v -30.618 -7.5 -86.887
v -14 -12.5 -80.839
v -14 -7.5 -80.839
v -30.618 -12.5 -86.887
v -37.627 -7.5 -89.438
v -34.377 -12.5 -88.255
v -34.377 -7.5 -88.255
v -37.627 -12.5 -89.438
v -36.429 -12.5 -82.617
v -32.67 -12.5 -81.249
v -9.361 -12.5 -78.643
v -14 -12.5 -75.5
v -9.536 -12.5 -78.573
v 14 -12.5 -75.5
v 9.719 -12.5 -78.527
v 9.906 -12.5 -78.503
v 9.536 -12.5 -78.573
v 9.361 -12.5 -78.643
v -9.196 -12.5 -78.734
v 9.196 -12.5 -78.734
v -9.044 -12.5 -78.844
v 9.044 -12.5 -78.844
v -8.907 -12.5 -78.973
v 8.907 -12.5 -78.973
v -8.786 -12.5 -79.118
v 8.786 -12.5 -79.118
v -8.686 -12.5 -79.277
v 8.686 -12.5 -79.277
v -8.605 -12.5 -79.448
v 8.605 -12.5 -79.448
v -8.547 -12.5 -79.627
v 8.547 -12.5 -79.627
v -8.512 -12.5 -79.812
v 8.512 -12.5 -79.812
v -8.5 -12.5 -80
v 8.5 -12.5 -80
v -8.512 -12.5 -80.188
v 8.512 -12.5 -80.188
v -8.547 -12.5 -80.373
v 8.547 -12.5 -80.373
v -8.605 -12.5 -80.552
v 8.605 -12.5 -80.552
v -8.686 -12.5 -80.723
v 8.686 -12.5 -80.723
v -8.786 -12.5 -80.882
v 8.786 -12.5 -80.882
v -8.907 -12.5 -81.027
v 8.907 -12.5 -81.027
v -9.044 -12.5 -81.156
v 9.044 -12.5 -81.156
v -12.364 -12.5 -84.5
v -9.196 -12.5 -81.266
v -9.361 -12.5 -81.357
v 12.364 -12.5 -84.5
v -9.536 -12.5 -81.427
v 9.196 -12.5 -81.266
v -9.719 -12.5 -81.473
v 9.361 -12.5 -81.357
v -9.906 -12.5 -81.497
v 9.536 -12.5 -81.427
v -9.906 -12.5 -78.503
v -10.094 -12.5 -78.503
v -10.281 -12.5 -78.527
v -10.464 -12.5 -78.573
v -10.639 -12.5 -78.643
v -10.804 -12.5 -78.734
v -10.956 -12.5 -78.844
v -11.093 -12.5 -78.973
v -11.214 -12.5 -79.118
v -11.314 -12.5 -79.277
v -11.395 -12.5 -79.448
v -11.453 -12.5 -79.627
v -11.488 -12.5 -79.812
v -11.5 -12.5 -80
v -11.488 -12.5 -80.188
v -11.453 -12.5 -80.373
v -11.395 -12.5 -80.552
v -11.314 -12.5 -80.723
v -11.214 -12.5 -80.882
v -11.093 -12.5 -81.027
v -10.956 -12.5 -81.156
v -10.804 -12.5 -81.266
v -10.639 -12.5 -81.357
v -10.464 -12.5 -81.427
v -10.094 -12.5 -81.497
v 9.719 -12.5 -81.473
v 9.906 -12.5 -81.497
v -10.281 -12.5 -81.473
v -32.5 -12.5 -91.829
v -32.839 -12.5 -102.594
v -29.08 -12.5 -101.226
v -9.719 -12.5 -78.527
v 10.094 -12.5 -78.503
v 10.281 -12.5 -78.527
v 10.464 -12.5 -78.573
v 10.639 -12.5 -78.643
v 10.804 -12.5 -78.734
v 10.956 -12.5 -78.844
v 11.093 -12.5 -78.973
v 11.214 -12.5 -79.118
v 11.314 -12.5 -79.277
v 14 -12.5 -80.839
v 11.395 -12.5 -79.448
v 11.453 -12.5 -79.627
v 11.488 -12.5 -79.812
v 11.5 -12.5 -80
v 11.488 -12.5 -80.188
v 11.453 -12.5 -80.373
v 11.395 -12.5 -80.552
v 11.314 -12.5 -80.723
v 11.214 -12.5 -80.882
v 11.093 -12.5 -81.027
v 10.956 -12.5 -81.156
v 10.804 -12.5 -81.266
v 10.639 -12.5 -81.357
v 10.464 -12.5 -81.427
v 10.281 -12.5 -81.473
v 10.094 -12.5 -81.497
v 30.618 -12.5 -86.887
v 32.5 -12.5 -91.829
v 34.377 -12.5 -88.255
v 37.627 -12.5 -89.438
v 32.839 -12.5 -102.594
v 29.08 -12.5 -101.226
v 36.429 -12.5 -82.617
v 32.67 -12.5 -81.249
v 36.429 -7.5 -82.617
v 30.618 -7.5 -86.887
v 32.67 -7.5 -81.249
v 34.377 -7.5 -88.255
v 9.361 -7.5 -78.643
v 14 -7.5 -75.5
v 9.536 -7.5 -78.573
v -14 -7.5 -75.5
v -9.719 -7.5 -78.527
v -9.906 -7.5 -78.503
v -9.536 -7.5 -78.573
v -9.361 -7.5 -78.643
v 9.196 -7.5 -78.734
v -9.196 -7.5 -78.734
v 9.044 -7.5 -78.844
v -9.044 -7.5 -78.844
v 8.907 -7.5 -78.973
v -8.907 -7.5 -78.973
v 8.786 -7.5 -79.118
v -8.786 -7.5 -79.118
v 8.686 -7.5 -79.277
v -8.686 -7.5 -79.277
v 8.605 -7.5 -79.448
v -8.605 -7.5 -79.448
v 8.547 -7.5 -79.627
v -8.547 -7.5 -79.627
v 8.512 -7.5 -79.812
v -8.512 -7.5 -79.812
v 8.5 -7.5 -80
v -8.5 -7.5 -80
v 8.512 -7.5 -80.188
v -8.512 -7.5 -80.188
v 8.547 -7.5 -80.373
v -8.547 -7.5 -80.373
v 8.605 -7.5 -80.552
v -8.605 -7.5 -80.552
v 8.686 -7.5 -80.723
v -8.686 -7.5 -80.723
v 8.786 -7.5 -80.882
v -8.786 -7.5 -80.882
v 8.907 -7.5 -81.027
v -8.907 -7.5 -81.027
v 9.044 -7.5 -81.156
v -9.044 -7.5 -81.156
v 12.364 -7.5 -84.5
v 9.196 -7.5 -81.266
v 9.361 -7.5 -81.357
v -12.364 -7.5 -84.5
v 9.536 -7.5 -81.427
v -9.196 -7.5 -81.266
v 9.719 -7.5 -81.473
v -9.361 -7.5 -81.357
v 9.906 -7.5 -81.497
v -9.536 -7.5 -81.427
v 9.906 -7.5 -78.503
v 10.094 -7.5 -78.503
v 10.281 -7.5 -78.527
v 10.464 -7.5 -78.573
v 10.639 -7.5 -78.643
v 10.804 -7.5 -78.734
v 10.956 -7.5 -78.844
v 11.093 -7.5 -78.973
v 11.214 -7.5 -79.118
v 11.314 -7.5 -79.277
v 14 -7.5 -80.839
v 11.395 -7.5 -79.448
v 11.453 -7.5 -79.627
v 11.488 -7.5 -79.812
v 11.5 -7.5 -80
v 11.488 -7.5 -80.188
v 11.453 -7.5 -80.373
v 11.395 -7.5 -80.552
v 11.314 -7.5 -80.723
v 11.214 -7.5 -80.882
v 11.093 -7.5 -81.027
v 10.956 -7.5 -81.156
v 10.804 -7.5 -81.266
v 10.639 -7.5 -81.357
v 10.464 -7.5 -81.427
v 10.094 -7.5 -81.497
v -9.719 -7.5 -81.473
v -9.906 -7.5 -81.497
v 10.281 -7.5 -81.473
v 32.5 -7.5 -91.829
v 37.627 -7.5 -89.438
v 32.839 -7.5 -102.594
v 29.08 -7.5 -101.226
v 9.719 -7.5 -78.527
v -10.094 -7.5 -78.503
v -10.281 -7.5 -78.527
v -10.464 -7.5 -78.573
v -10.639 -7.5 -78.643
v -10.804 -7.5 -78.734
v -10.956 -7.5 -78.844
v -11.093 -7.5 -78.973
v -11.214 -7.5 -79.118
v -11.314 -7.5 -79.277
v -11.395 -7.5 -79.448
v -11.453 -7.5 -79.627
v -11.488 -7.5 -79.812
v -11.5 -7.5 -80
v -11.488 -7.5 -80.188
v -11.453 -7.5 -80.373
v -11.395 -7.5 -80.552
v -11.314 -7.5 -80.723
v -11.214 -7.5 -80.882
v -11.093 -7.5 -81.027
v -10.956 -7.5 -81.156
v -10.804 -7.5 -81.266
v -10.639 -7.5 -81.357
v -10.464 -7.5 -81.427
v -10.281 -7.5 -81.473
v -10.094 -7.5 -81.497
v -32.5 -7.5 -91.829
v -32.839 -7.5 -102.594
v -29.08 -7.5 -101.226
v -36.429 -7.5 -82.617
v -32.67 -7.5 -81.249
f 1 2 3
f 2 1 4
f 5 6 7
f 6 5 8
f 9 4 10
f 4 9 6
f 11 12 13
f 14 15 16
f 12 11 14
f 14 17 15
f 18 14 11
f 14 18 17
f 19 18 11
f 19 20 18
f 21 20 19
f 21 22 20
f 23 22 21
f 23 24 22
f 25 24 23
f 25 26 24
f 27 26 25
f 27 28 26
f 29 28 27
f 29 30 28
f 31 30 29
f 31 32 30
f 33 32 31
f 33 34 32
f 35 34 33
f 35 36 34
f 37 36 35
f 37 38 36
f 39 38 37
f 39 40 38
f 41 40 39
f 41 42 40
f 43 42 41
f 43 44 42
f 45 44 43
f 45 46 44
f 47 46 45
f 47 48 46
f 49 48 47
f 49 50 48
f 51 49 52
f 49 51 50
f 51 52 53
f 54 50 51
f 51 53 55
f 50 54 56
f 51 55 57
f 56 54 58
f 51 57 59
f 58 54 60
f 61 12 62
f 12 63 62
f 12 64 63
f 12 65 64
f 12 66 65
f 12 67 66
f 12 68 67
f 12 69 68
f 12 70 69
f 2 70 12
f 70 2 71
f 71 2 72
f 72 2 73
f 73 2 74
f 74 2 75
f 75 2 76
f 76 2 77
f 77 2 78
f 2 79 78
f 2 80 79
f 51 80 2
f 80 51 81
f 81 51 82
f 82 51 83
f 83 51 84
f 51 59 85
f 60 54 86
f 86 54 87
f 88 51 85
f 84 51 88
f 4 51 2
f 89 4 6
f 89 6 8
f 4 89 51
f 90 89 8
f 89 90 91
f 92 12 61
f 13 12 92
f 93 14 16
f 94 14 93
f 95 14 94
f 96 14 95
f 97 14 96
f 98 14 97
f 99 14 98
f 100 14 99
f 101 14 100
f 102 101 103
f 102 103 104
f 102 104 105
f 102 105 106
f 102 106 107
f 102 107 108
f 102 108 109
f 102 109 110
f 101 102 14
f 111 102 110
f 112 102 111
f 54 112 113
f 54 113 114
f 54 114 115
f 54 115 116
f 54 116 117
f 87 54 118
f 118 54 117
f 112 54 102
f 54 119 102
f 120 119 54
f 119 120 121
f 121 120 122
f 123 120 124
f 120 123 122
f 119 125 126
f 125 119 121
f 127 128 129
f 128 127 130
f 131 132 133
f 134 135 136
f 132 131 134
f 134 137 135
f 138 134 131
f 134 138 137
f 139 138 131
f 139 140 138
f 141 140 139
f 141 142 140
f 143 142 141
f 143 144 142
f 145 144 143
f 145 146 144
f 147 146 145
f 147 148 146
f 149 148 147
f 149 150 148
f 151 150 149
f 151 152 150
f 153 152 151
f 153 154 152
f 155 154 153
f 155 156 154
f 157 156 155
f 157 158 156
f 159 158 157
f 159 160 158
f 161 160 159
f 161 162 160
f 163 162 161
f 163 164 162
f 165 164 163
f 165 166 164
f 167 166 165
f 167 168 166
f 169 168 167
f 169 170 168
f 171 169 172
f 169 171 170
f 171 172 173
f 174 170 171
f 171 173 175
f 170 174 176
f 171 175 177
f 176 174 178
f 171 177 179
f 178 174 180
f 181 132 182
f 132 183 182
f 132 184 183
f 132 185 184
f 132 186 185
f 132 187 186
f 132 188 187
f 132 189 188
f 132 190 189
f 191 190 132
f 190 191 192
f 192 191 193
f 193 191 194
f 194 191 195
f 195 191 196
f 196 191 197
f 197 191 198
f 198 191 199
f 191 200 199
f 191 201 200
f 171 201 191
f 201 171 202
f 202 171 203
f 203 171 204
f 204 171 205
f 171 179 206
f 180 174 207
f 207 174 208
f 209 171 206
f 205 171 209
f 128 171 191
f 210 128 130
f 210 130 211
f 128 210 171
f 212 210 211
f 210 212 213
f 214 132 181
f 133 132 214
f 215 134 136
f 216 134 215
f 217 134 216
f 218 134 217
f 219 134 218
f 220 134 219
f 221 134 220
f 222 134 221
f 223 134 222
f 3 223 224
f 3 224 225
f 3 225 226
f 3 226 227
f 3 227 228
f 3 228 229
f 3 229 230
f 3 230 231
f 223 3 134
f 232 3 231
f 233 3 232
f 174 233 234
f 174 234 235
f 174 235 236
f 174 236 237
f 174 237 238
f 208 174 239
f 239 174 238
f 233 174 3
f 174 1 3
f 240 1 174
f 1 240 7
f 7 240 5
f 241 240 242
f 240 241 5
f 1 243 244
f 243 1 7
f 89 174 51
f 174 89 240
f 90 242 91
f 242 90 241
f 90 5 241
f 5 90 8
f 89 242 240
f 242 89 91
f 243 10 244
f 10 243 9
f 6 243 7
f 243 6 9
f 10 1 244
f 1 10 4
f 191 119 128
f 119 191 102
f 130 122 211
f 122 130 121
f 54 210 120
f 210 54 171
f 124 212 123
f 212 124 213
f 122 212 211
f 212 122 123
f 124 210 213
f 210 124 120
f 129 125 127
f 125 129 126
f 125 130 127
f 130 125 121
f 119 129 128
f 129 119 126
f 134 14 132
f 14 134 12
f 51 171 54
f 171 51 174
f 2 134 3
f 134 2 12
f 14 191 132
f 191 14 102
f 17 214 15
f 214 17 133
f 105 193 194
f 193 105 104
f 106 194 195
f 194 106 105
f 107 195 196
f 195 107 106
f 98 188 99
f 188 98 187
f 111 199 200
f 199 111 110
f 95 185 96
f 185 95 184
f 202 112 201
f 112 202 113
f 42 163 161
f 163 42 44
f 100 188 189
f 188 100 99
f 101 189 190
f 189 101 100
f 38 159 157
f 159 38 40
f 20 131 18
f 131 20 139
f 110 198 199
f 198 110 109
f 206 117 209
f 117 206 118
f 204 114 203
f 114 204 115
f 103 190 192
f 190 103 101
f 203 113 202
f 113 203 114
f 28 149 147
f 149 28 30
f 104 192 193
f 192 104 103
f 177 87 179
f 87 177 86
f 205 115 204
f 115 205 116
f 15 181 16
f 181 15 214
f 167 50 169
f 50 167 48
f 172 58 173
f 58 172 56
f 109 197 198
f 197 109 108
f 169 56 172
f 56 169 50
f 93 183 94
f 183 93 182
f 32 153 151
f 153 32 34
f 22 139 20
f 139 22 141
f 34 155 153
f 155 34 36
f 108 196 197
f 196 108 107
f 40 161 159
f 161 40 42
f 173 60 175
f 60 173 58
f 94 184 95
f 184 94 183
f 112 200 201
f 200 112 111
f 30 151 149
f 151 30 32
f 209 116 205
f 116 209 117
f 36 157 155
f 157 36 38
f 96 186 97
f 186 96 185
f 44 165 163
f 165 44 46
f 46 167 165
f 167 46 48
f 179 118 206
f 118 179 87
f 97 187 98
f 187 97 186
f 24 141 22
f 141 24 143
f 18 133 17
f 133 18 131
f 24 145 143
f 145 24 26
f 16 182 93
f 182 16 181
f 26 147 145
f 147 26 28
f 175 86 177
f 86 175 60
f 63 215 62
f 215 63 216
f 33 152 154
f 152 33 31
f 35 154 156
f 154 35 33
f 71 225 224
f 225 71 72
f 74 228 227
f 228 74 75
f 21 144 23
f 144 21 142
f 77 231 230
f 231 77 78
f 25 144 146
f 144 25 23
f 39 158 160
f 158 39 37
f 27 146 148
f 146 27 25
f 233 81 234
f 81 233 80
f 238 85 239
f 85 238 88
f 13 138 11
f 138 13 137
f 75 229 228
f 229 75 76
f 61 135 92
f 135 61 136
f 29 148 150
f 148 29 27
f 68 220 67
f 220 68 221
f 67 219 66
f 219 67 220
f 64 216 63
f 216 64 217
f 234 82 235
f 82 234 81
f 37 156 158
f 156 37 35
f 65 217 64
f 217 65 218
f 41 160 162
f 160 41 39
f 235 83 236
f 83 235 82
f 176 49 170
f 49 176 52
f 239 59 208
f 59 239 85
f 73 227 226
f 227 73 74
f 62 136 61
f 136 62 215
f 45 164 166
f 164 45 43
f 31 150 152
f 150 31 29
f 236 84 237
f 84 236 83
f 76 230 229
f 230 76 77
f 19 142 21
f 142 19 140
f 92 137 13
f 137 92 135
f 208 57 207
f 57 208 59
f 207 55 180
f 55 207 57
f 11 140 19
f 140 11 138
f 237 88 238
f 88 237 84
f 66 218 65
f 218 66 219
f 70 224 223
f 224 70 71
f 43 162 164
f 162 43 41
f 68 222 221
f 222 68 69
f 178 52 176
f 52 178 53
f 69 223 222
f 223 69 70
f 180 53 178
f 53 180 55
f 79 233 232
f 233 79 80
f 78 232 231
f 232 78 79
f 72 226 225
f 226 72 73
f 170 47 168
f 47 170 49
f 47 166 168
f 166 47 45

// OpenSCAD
// O apoio será composto de um suporte
// que funcionará sob leve pressão no
// vão do console. A parte mais complexa
// da modelagem é este suporte.

// Altura total do suporte (sob pressão)
a_suporte = 100;

// Dimensões da mola
c_mola = 35;
d_mola = 7;

// Curso total da mola
corrida_mola = 15;

// Curso da mola sob pressão
trabalho_mola = 10;

// Dimensões dos eixos
d_eixo = 5;
c_eixo = c_mola + 20;

// Dimensões do corpo
l_corpo = 20 + 3 * d_eixo;
p_corpo = 10;
c_corpo = a_suporte / 2 - ( c_mola - trabalho_mola ) / 2;

folga = 10;

// Distância entre clilindros laterais e parede:
d_cil_par = 2;

// Dimensões dos vãos para os links:
l_vaos = 4;
d_vao_parede_a = 15;
d_vao_parede_b = 5;

// Dimensões do encaixe:
l_encaixe = l_corpo / 2;

// Diâmetro do eixo para sapata:
d_parafuso = 3.5;

// Teremos dois elementos estruturais que
// suportarão eixos e mola:

module corpo(){
    
    difference(){
        union(){
            // Corpo:
            difference(){
                translate( [ 0, -c_corpo / 2 - ( c_mola - trabalho_mola ) / 2, 0 ] )
                    cube( [ l_corpo, c_corpo, p_corpo ], center = true );
               translate( [ -500, -1000 - corrida_mola - c_corpo + 1.4 * p_corpo, -500 ] )
                   cube( [ 1000, 1000, 1000 ] );
            }
            // Encaixe
            translate( [ -l_encaixe / 2, -corrida_mola - c_corpo + p_corpo, 0 ] )
                rotate( 90, [ 0, 1, 0 ] )
                    cylinder( d = p_corpo, h = l_encaixe, $fn = 50 );

translate( [ -l_corpo / 2, -c_corpo / 2 - ( c_mola - trabalho_mola ) / 2 + 8, 0 ] )
    rotate( 90, [ 0, 0, 1 ] )
        cylinder( h = p_corpo / 2, r = 10, $fn = 3 );
translate( [ l_corpo / 2, -c_corpo / 2 - ( c_mola - trabalho_mola ) / 2 + 8, 0 ] )
    rotate( 90, [ 0, 0, 1 ] )
        cylinder( h = p_corpo / 2, r = 10, $fn = 3 );
        }
        
        // Cilindros para os eixos:
        rotate( 90, [ 1, 0, 0 ] )
            cylinder( d = d_eixo, h = c_eixo / 2 + corrida_mola / 2, $fn = 50 );
        translate( [ l_corpo / 2 - d_eixo / 2 - d_cil_par, 0, 0 ] )
            rotate( 90, [ 1, 0, 0 ] )
                cylinder( d = d_eixo, h = c_eixo/ 2 + corrida_mola / 2, $fn = 50 );
        translate( [ -( l_corpo / 2 - d_eixo / 2 - d_cil_par ), 0, 0 ] )
            rotate( 90, [ 1, 0, 0 ] )
                cylinder( d = d_eixo, h = c_eixo / 2 + corrida_mola / 2, $fn = 50 );
        // Vãos para os elos:
        translate( [ -l_vaos / 2 + ( l_corpo / 2 - d_eixo / 2 - d_cil_par ) / 2, -c_corpo - ( c_mola - trabalho_mola ) / 2 + d_vao_parede_a, -25 ] )
            cube( [ l_vaos, c_corpo - ( d_vao_parede_a + d_vao_parede_b ), 50 ] );
        translate( [ -l_vaos / 2 - ( l_corpo / 2 - d_eixo / 2 - d_cil_par ) / 2, -c_corpo - ( c_mola - trabalho_mola ) / 2 + d_vao_parede_a, -25 ] )
            cube( [ l_vaos, c_corpo - ( d_vao_parede_a + d_vao_parede_b ), 50 ] );
        
        // Furo para o eixo da sapata:
        translate( [ -250, -corrida_mola - c_corpo + p_corpo, 0 ] )
            rotate( 90, [ 0, 1, 0 ] )
                cylinder( h = 500, d = d_parafuso, $fn = 50 );
    }
}

l_aba_pe = ( l_corpo - l_encaixe ) / 2 - 0.5;
p_aba_pe = p_corpo * 1.0;
h_aba_pe = 10;
delta_aba_pe = 0.1;

h_sapata = 2;
l_sapata = 50;
c_sapata = 30;

module sapata(){
    difference(){
        union(){
            translate( [ -l_aba_pe / 2 - ( l_corpo / 2 - l_aba_pe / 2 ), -corrida_mola - c_corpo + 1.4 * p_corpo - h_aba_pe - delta_aba_pe, -p_aba_pe / 2 ] )
                cube( [ l_aba_pe, h_aba_pe - p_aba_pe / 2, p_aba_pe ] );
            translate( [ -l_aba_pe / 2 - ( l_corpo / 2 - l_aba_pe / 2 ), -corrida_mola - c_corpo + 1.4 * p_corpo - h_aba_pe - delta_aba_pe + ( h_aba_pe - p_aba_pe / 2 ), 0 ] )
                rotate( 90, [ 0, 1, 0 ] )
                cylinder( h = l_aba_pe, d = p_aba_pe, $fn = 50 );
            translate( [ -l_aba_pe / 2 + ( l_corpo / 2 - l_aba_pe / 2 ), -corrida_mola - c_corpo + 1.4 * p_corpo - h_aba_pe - delta_aba_pe, -p_aba_pe / 2 ] )
                cube( [ l_aba_pe, h_aba_pe - p_aba_pe / 2, p_aba_pe ] );
            translate( [ -l_aba_pe / 2 + ( l_corpo / 2 - l_aba_pe / 2 ), -corrida_mola - c_corpo + 1.4 * p_corpo - h_aba_pe - delta_aba_pe + ( h_aba_pe - p_aba_pe / 2 ), 0 ] )
                rotate( 90, [ 0, 1, 0 ] )
                cylinder( h = l_aba_pe, d = p_aba_pe, $fn = 50 );
            
            translate( [ -l_sapata / 2, , -corrida_mola - c_corpo + 1.4 * p_corpo - h_aba_pe - delta_aba_pe- h_sapata + 1, -c_sapata / 2 ] )
                cube( [ l_sapata, h_sapata, c_sapata ] );
        }
        // Furo para o eixo da sapata:
        translate( [ -250, -corrida_mola - c_corpo + p_corpo, 0 ] )
            rotate( 90, [ 0, 1, 0 ] )
                cylinder( h = 500, d = d_parafuso, $fn = 50 );
    }
}

d_links_furos = 40;
d_furos = 3.3;
d_links = d_links_furos + 10;
l_links = d_vao_parede_a + 5;
a_links = 4;
module links(){
    difference(){
        translate( [ -l_links / 2, -d_links / 2, p_corpo / 2 + 0.4 ] )
            cube( [ l_links, d_links, a_links ] );
        
        translate( [ ( l_corpo / 2 - d_eixo / 2 - d_cil_par ) / 2, -d_links_furos / 2, -50 ] )
            cylinder( d = d_furos, h = 100, $fn = 50 );
        translate( [ -( l_corpo / 2 - d_eixo / 2 - d_cil_par ) / 2, -d_links_furos / 2, -50 ] )
            cylinder( d = d_furos, h = 100, $fn = 50 );
        translate( [ ( l_corpo / 2 - d_eixo / 2 - d_cil_par ) / 2, d_links_furos / 2, -50 ] )
            cylinder( d = d_furos, h = 100, $fn = 50 );
        translate( [ -( l_corpo / 2 - d_eixo / 2 - d_cil_par ) / 2, d_links_furos / 2, -50 ] )
            cylinder( d = d_furos, h = 100, $fn = 50 );
    }
}

//theta_garra = 30;
//l_min_garra = 65;
//w_garra = 3;
//a_garra = 5;
//l_dedo_garra = 10;
//w_dedo_garra = w_garra;

theta_garra = 20;
l_min_garra = 65;
w_garra = 4;
a_garra = 5;
l_dedo_garra = 10;
w_dedo_garra = w_garra;

module meia_garra(){
    rotate( theta_garra, [ 0, 0, 1 ] ){
        cube( [ w_garra, l_min_garra / cos( theta_garra ) / 2 + 1, a_garra ] );
    translate( [ -l_dedo_garra, l_min_garra / cos( theta_garra ) / 2, 0 ] )
        cube( [ l_dedo_garra + w_garra, w_dedo_garra, a_garra ] );
    translate( [ 0, l_min_garra / cos( theta_garra ) / 2 * 0.9, 0 ] )
        cube( [ 6 + w_garra, w_dedo_garra, a_garra ] );
    }
}

c_cubo_garra = 28;
l_cubo_garra = 9;
dist_hole_garra = 20;
d_hole_garra = 3;
module garra(){
    difference(){
        translate( [ 0, a_garra - ( c_mola - trabalho_mola ) / 2, -l_braco ] )
            rotate( 90, [ 1, 0, 0 ] )
                rotate( 90, [ 0, 0, 1 ] ){
                    meia_garra();
                    mirror( [ 0, 1, 0 ] )
                        meia_garra();
                    translate( [ -l_cubo_garra / 2 + 0, -c_cubo_garra / 2, 0 ] )
                        cube( [ l_cubo_garra, c_cubo_garra, a_garra ] );
                }
                
       translate( [ dist_hole_garra / 2, 0, -l_braco ] )
            rotate( 90, [ 1, 0, 0 ] )
                cylinder( h = 1000, d = d_hole_garra, $fn = 50 );
       translate( [ -dist_hole_garra / 2, 0, -l_braco ] )
            rotate( 90, [ 1, 0, 0 ] )
                cylinder( h = 1000, d = d_hole_garra, $fn = 50 );
    }
}

module arco( d, h, w, l ){
    difference(){
        translate( [ 0, l - d / 2, 0 ] )
            cylinder( d = d, h = h, $fn = 50 );
        translate( [ -2 * d, -2 * d, -h + 0.1 ] )
            cube( [ 4 * d, 2 * d, 2 * h + 0.1 ] );
        translate( [ w / 2, -0.1,  -h + 0.1 ] )
            cube( [ 4 * d, 2 * d, 2 * h + 0.1 ] );
        mirror( [ 1, 0, 0 ] )
            translate( [ w / 2, -0.1,  -h + 0.1 ] )
                cube( [ 4 * d, 2 * d, 2 * h + 0.1 ] );
    }   
}

h_conect = 20;
c_conect = 10;
y_conect = 10;
l_braco = 80;
delta_braco = 5;
delta_arco_conect = 10;
lip_len = 2;
lip_thick = 2;
x_conect_hand = c_cubo_garra;
y_conect_hand = 5;
z_conect_hand = 10;

module conect(){
    difference(){
        translate( [0, -( c_mola - trabalho_mola ) / 2, -p_corpo / 2 + lip_len ] )
            mirror( [ 0, 0, 1 ] )
                rotate( 90, [ 1, 0, 0 ] )
                    arco( d = 1.5 * l_corpo, h = y_conect, w = l_corpo + lip_thick, l = h_conect );
        cube( [ l_corpo, 30 * c_corpo, p_corpo ], center = true );
        cube( [ l_corpo - 10, 30 * c_corpo, p_corpo + 20 ], center = true );
    }
    translate( [ -y_conect / 2, -y_conect - ( c_mola - trabalho_mola ) / 2, -( l_braco + delta_braco - h_conect ) - p_corpo / 2 - h_conect + delta_braco ] )
        cube( [ y_conect, y_conect, l_braco + delta_braco - h_conect ] );
    difference(){
        translate( [ -x_conect_hand / 2, -y_conect_hand - ( c_mola - trabalho_mola ) / 2, - p_corpo / 2 - l_braco ] )
            cube( [ x_conect_hand, y_conect_hand, z_conect_hand ] );
       translate( [ dist_hole_garra / 2, 0, -l_braco ] )
            rotate( 90, [ 1, 0, 0 ] )
                cylinder( h = 1000, d = d_hole_garra, $fn = 50 );
       translate( [ -dist_hole_garra / 2, 0, -l_braco ] )
            rotate( 90, [ 1, 0, 0 ] )
                cylinder( h = 1000, d = d_hole_garra, $fn = 50 );
    }
}


//color( "yellow", 1.0 ) corpo();
//color( "green", 1.0 ) sapata();
//mirror( [ 0, 1, 0 ] ){
//    color( "yellow", 1.0 ) corpo();
//    color( "green", 1.0 ) sapata();
//}
//color( "red", 1.0 ) links();
//mirror( [ 0, 0, 1 ] )
//    color( "red", 1.0 ) links();
//
//color( "gray", 1.0 ) conect();
color( "yellow", 1.0 ) garra();
//translate( [ 0, ( c_mola - trabalho_mola ) + y_conect, 0 ] ){
//    color( "gray", 1.0 ) conect();
//    color( "yellow", 1.0 ) garra();
//}
